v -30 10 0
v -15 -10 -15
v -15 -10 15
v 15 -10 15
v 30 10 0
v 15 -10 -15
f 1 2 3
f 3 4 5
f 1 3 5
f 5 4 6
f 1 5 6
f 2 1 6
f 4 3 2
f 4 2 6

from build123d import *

# Parameters (mm, degrees)
SKETCH1_W           = 60
SKETCH1_H           = 20
BOSS_EXTRUDE1_DEPTH = 15
CUT_EXTRUDE1_DEPTH  = 22
CUT_EXTRUDE2_DEPTH  = 34


with BuildPart() as part:
    # Sketch1 → Boss-Extrude1 (new body, symmetric)
    with BuildSketch(Plane.XY):
        Rectangle(SKETCH1_W, SKETCH1_H)
    extrude(amount=BOSS_EXTRUDE1_DEPTH, both=True)

    # Sketch2 → Cut-Extrude1 (cut, symmetric)
    with BuildSketch(Plane.XY):
        Polygon((-15, -10), (-30, 10), (-30, -10), align=None)
        Polygon((15, -10), (30, 10), (30, -10), align=None)
    extrude(amount=CUT_EXTRUDE1_DEPTH, both=True, mode=Mode.SUBTRACT)

    # Sketch3 → Cut-Extrude2 (cut, symmetric)
    with BuildSketch(Plane(origin=(0, 0, 0), x_dir=(0, 0, -1), z_dir=(1, 0, 0))):
        Polygon((-15, 10), (-15, -10), (0, 10), align=None)
        Polygon((15, 10), (0, 10), (15, -10), align=None)
    extrude(amount=CUT_EXTRUDE2_DEPTH, both=True, mode=Mode.SUBTRACT)


solid = part.part
